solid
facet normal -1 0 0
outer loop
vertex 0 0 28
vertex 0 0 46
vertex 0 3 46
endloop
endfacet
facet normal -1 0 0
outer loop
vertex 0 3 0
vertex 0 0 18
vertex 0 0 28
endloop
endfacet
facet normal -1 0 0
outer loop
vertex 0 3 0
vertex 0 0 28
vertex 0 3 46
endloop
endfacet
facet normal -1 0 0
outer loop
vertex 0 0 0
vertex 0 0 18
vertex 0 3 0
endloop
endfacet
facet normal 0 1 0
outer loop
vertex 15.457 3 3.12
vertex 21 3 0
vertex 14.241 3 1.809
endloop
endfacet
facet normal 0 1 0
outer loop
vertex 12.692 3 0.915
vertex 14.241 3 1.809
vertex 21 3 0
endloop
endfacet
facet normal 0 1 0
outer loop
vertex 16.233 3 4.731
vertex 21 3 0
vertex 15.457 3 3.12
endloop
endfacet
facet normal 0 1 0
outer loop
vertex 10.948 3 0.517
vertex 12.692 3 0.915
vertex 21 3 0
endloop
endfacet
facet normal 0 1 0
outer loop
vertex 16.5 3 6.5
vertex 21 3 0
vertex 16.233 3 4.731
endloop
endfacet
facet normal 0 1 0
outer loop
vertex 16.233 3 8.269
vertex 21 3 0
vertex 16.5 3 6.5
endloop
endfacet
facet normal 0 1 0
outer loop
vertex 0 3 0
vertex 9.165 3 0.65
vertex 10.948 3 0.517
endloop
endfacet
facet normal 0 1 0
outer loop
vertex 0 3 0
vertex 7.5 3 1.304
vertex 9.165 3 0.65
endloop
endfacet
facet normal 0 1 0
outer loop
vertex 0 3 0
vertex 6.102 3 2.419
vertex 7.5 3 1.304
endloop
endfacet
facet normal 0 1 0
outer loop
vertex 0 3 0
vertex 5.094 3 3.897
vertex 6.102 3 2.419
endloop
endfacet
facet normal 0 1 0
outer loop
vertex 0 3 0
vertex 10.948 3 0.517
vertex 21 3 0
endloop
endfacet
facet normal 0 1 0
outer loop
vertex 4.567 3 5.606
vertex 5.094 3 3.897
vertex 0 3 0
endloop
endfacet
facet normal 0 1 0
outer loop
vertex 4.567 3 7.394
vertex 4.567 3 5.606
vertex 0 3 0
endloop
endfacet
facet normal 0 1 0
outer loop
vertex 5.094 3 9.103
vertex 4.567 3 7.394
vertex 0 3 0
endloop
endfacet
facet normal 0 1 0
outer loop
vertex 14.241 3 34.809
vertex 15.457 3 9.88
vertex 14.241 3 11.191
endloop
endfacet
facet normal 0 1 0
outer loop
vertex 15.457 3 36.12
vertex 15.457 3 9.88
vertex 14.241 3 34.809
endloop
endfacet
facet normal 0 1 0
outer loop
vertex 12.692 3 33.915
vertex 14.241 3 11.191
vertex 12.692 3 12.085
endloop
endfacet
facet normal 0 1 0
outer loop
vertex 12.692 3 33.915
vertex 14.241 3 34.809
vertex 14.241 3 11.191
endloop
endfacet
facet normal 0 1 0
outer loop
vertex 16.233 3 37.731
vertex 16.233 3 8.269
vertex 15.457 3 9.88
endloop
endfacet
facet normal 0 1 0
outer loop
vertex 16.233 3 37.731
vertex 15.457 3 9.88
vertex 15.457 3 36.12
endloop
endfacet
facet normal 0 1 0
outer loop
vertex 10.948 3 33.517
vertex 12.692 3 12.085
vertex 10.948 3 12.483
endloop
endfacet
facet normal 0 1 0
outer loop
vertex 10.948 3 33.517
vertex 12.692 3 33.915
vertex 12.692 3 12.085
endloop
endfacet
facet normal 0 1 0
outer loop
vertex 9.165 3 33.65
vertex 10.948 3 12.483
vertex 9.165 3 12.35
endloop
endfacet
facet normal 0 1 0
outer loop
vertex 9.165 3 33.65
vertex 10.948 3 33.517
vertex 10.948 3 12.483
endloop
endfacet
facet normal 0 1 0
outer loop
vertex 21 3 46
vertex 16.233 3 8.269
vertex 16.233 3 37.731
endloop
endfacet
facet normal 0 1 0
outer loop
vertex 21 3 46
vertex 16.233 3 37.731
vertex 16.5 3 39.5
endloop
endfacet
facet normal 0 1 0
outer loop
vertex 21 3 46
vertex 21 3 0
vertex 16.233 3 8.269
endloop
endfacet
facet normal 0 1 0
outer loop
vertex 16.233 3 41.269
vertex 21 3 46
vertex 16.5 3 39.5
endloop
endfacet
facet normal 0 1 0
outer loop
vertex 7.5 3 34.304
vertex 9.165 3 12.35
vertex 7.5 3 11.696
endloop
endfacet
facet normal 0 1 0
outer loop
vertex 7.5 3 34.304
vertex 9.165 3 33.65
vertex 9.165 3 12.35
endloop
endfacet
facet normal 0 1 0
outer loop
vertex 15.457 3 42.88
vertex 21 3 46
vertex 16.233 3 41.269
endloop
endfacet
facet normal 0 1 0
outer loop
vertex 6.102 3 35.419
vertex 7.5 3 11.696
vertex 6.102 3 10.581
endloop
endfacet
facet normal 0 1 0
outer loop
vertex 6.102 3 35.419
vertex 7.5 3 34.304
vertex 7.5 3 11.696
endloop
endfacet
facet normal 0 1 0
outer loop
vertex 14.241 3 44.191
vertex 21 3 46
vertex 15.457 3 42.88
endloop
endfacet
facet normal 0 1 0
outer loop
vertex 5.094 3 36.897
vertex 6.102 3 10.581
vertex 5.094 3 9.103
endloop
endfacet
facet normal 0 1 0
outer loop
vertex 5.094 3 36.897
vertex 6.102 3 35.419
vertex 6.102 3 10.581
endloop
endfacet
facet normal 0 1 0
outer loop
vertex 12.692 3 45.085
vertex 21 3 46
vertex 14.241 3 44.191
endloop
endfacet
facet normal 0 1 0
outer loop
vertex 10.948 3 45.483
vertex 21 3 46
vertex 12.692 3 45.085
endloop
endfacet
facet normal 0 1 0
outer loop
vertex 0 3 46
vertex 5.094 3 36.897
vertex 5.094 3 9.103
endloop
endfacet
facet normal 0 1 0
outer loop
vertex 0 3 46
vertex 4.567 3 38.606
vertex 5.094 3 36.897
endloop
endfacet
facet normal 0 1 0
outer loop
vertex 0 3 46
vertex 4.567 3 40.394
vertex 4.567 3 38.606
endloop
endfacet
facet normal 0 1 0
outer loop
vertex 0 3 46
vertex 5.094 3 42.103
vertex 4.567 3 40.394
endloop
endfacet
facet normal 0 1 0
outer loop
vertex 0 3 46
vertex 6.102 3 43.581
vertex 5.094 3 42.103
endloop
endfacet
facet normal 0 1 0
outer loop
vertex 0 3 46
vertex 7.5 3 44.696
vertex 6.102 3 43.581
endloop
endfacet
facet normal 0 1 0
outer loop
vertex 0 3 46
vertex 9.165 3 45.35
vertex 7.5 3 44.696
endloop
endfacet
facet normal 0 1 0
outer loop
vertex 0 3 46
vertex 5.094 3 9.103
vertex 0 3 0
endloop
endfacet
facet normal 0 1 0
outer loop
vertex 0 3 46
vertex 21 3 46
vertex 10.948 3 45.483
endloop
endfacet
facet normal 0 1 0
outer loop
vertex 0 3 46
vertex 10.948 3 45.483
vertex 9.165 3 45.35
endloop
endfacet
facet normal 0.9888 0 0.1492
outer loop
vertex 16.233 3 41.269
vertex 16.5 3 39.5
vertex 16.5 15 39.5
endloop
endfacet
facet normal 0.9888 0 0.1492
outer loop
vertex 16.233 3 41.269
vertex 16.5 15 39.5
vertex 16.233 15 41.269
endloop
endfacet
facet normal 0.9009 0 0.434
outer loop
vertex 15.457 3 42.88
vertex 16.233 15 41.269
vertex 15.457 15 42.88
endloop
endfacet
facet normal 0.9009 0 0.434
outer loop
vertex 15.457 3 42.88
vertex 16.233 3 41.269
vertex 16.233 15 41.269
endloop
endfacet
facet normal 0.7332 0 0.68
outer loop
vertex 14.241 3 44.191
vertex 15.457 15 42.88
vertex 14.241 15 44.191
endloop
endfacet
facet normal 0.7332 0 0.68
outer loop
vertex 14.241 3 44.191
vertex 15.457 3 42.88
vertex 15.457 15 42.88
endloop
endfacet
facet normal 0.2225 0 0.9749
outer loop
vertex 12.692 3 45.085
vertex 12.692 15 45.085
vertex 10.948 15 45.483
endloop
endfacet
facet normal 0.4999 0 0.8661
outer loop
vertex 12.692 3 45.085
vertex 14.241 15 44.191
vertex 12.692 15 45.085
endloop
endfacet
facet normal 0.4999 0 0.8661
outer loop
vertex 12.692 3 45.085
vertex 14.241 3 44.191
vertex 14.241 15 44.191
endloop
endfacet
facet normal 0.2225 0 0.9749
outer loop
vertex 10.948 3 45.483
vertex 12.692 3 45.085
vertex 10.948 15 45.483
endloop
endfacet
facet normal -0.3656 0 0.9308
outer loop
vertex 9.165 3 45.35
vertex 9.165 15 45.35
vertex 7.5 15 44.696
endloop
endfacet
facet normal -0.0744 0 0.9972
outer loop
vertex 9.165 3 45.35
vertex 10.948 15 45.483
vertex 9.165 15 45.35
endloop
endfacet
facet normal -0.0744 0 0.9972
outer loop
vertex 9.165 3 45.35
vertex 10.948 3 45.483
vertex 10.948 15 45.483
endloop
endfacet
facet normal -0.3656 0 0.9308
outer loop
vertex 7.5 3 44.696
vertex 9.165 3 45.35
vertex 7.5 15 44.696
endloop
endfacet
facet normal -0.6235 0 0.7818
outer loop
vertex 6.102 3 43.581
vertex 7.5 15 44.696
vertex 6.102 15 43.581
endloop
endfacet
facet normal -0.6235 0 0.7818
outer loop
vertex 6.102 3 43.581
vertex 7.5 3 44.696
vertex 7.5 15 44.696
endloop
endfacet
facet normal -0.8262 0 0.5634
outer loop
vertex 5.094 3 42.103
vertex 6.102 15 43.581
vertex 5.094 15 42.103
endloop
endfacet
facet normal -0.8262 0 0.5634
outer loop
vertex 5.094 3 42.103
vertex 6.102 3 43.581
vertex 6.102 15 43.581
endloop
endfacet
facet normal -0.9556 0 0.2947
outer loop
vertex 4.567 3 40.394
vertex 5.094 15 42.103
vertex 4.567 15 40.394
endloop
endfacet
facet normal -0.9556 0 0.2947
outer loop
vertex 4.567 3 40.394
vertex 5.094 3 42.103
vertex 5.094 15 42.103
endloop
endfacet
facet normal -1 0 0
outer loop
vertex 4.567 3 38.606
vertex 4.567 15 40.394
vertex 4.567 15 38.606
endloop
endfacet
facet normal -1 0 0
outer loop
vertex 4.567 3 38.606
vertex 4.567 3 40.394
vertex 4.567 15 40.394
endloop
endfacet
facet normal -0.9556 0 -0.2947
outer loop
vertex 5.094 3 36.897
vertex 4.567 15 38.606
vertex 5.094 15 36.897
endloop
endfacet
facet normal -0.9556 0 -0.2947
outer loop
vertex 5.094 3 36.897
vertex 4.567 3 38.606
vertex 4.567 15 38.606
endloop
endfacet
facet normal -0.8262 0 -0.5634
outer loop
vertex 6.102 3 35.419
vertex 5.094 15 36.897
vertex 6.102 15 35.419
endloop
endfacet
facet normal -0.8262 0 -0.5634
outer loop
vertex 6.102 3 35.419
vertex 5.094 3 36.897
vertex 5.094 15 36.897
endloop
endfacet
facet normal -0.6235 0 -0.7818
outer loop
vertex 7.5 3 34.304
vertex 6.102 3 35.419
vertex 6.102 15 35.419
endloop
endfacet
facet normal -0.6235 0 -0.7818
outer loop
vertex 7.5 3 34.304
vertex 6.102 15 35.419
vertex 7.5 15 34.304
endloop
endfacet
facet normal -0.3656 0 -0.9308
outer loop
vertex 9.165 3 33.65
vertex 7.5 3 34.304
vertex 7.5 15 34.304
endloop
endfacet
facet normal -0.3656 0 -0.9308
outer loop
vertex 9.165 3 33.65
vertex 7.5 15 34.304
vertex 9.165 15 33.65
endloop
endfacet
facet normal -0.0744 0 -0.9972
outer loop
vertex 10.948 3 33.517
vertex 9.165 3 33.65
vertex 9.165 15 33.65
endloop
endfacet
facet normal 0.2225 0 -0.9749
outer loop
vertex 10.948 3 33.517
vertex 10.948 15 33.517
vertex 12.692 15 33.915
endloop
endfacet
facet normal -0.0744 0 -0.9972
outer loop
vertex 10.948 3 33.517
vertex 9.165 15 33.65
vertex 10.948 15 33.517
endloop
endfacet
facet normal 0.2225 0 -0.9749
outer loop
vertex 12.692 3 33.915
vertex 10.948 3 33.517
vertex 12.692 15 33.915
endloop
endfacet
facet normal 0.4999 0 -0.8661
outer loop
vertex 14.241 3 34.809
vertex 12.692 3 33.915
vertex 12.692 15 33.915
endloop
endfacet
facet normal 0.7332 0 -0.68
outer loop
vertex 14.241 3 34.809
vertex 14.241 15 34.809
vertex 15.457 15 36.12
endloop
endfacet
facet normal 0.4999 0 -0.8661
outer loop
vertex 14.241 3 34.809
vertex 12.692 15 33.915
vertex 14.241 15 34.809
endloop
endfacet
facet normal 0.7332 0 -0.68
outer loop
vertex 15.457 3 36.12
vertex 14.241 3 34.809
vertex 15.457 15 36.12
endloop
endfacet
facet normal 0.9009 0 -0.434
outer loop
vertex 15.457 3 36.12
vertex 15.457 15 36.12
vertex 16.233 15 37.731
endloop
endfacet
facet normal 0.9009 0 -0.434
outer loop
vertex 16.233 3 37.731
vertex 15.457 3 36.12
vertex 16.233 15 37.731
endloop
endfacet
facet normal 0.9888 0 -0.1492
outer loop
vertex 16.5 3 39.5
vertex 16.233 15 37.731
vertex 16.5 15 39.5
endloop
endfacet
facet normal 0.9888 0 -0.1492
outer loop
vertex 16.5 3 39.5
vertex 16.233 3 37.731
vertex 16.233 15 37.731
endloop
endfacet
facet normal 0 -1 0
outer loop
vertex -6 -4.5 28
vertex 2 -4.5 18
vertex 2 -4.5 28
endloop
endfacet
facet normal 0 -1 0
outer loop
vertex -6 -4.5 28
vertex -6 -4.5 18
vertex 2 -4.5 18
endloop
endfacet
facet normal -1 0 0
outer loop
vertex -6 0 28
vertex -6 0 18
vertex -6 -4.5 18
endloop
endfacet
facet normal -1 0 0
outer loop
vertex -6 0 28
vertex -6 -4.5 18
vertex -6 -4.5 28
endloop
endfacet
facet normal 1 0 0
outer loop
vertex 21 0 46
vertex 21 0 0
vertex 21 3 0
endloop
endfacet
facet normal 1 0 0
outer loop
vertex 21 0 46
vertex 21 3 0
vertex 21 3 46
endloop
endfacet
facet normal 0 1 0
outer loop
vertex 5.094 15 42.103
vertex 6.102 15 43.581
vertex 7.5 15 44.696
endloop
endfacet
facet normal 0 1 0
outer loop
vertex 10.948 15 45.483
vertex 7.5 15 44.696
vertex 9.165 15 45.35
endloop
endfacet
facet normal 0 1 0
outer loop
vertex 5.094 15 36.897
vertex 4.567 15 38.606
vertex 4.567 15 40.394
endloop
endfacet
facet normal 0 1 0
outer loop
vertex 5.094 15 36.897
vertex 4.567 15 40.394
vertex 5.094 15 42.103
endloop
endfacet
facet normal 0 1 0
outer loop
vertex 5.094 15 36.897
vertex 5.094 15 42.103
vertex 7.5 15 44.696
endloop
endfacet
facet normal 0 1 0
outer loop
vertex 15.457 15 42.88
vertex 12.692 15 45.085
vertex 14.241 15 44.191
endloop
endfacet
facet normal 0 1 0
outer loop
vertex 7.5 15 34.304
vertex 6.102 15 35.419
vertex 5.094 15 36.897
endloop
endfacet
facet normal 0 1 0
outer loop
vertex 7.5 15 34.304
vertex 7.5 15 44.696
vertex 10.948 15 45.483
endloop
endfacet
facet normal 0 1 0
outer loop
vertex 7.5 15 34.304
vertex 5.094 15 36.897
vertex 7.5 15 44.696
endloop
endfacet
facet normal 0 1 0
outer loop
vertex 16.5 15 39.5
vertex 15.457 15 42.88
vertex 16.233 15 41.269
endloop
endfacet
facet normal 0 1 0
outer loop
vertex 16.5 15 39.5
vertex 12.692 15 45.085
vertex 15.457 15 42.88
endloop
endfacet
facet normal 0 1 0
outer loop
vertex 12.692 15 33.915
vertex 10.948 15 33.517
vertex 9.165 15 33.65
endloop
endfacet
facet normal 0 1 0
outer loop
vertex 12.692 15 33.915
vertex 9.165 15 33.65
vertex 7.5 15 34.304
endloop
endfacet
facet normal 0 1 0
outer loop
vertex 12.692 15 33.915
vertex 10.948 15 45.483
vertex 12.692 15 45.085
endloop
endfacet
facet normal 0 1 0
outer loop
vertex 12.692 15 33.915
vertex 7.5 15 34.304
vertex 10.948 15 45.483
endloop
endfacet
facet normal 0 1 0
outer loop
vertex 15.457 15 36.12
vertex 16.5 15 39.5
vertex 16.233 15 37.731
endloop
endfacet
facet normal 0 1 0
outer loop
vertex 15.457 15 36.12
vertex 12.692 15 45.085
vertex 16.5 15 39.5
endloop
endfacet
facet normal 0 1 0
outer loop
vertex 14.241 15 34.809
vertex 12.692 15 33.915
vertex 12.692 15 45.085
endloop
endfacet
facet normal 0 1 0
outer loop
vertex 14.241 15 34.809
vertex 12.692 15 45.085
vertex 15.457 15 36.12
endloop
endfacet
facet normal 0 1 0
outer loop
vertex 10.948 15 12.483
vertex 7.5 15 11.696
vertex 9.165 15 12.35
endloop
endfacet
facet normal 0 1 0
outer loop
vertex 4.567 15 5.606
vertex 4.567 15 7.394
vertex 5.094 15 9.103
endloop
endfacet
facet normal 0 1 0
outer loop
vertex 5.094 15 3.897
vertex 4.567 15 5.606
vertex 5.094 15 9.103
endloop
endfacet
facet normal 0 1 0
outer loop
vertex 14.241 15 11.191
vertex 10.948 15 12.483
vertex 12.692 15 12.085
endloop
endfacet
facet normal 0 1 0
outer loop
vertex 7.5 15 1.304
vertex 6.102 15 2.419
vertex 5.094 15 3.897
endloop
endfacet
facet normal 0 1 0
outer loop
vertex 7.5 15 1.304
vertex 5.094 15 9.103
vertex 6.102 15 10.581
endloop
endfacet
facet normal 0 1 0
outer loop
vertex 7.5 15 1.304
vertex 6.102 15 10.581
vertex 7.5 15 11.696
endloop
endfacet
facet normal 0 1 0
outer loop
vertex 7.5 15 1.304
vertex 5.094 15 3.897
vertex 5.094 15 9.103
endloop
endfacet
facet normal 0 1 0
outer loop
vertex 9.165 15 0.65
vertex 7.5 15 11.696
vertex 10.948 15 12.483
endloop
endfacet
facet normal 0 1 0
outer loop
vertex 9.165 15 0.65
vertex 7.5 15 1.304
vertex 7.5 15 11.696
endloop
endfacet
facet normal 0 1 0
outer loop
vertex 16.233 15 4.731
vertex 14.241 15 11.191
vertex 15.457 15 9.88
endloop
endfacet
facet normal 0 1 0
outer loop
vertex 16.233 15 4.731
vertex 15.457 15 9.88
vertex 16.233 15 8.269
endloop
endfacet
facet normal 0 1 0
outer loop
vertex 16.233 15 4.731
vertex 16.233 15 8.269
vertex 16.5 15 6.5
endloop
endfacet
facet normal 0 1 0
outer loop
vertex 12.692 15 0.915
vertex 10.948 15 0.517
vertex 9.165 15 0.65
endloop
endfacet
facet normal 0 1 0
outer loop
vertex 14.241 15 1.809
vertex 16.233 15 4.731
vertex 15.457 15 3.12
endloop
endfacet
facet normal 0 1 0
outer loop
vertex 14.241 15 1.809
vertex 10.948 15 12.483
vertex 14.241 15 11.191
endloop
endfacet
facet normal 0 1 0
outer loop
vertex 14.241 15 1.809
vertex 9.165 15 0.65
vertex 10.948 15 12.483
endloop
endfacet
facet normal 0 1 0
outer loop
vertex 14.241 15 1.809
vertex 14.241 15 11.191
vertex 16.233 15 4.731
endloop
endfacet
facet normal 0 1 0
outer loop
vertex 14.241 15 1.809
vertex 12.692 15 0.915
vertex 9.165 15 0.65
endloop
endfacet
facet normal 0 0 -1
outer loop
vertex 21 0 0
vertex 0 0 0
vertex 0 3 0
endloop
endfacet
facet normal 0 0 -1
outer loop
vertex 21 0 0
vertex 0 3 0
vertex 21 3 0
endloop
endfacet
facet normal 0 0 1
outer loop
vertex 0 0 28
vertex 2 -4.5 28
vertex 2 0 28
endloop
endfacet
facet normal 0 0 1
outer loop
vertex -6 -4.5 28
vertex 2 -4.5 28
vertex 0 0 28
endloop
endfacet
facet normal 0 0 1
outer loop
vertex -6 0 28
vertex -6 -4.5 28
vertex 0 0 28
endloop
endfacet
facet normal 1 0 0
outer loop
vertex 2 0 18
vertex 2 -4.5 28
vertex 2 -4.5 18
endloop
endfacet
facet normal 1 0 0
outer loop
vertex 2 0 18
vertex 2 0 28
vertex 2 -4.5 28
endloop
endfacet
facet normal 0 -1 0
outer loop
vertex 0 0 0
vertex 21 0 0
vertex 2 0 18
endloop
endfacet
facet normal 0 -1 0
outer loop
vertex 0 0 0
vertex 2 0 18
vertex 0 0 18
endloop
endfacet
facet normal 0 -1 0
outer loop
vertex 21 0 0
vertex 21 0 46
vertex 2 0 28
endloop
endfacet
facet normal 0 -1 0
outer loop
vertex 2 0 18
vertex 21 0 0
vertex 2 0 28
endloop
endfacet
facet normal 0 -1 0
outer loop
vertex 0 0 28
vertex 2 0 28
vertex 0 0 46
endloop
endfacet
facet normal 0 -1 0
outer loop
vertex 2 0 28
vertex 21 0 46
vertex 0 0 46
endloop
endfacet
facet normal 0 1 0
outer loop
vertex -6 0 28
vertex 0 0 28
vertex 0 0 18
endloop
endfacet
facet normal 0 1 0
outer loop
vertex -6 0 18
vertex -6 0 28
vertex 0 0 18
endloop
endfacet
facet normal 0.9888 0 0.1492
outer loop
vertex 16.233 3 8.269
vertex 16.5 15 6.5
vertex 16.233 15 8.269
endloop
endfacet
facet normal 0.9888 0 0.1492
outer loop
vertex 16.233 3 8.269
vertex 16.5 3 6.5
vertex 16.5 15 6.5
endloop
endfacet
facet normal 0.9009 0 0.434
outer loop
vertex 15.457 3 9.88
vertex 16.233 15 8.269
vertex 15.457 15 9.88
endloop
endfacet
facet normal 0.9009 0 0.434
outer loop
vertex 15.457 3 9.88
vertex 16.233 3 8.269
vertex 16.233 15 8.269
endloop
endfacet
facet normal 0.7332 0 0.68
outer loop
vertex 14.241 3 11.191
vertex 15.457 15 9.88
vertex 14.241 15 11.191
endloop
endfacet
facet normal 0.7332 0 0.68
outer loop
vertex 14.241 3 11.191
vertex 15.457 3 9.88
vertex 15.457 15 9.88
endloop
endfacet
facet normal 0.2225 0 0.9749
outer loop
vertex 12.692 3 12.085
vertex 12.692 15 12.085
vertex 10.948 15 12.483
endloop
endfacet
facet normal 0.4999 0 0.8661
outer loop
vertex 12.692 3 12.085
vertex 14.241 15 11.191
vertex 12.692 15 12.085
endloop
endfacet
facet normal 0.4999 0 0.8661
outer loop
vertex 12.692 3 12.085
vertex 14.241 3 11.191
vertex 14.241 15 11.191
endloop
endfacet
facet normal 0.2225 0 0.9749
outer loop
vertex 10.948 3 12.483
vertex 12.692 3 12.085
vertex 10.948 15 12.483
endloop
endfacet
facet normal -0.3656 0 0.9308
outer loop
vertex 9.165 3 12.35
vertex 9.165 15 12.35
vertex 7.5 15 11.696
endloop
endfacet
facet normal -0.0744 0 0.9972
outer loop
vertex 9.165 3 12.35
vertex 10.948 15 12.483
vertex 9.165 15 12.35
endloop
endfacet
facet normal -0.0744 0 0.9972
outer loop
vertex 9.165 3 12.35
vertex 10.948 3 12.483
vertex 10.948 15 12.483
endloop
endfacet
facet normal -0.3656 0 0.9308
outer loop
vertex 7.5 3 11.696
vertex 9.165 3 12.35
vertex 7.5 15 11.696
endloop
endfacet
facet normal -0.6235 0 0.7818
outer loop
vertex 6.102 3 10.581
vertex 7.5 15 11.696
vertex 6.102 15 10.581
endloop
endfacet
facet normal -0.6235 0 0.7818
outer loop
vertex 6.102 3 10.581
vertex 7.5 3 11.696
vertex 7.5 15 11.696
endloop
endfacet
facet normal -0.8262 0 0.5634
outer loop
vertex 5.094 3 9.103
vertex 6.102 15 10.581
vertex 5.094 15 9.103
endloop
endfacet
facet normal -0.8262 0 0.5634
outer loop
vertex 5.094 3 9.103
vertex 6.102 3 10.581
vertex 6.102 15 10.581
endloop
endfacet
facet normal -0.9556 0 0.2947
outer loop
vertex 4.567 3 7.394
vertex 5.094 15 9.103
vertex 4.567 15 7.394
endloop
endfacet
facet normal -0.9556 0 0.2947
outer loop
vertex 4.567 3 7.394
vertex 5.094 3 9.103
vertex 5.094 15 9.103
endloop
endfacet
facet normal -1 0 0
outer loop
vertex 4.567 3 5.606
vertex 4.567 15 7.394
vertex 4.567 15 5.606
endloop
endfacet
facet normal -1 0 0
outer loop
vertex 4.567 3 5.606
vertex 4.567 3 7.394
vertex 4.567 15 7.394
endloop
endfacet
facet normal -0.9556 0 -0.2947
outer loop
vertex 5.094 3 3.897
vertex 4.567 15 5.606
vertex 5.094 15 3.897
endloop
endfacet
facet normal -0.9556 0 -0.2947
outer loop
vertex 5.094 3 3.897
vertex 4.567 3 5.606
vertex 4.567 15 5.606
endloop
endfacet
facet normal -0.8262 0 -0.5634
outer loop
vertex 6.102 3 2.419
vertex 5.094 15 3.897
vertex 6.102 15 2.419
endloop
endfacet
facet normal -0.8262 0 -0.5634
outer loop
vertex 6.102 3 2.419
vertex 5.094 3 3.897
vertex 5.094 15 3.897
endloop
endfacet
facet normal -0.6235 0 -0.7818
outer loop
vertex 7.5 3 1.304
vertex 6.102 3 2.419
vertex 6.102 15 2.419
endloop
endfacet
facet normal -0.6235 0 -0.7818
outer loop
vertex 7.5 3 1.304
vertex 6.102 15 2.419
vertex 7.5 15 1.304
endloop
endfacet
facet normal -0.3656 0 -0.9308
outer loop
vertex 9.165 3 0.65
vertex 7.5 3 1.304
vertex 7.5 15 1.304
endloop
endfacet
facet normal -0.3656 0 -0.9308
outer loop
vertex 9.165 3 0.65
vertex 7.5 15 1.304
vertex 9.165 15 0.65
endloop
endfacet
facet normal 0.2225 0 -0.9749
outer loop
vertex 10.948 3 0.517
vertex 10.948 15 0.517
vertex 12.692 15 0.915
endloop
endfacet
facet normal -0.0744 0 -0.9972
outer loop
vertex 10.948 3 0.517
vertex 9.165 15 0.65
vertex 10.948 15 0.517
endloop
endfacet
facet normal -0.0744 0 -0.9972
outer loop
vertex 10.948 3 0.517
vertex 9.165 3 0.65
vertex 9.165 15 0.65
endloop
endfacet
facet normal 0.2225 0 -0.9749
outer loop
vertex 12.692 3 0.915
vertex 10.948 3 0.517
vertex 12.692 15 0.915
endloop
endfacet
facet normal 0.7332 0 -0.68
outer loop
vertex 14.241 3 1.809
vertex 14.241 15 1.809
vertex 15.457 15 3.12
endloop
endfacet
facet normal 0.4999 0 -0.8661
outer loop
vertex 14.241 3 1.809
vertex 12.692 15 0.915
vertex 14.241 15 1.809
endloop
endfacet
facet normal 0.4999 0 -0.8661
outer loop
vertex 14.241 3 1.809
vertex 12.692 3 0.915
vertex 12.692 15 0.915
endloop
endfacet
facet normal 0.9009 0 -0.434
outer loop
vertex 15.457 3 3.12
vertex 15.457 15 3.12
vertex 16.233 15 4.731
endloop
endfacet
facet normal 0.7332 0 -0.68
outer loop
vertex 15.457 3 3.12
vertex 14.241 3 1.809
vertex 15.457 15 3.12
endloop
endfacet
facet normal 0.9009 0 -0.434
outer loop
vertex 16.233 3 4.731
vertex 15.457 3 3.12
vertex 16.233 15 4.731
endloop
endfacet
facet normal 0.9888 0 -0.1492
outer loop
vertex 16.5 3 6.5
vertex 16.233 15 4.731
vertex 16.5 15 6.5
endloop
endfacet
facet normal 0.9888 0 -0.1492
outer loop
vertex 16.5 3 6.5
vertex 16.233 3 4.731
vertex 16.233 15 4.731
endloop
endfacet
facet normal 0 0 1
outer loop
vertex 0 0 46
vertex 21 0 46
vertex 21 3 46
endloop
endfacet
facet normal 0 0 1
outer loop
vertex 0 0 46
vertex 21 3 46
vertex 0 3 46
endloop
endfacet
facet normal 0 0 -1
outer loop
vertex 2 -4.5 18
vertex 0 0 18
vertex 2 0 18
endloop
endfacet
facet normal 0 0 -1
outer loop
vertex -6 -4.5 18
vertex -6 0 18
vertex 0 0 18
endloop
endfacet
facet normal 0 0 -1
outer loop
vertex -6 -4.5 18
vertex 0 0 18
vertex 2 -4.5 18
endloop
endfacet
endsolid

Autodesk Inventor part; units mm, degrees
ref_plane "YZ Plane" through (0, 0, 0) normal (1, 0, 0) x (0, 1, 0)
ref_plane "XZ Plane" through (0, 0, 0) normal (0, 1, 0) x (-1, 0, 0)
ref_plane "XY Plane" through (0, 0, 0) normal (0, 0, 1) x (1, 0, 0)
sketch "Sketch1" plane through (0, 0, 0) normal (0, 1, 0) x (-1, 0, 0)
  line L0 (0, 0) -> (-21, 0)
  line L1 (-21, 0) -> (-21, 46)
  line L2 (-21, 46) -> (0, 46)
  line L3 (0, 46) -> (0, 0)
  dimension "d0" = 21
  dimension "d1" = 46
extrude "Extrusion1" add sketch "Sketch1" along normal blind 3
sketch "Sketch2" plane through (0, 3, 0) normal (0, 1, 0) x (1, 0, 0)
  line L0 (21, 0) -> (0, 0) projected
  line L1 (0, -46) -> (21, -46) projected
  circle A0 centre (10.5, -39.5) radius 6
  line L2 (0, 0) -> (0, -46) projected
  line L3 (0, -23) -> (21, -23)
  line L4 (21, -46) -> (21, 0) projected
  circle A1 centre (10.5, -6.5) radius 6
  dimension "d6" = 12
extrude "Extrusion2" add sketch "Sketch2" along normal blind 12 contours A0 | A1
sketch "Sketch3" plane through (0, 0, 0) normal (-1, 0, 0) x (0, 0, 1)
  line L0 (46, 0) -> (0, 0) projected
  line L1 (18, 0) -> (28, 0)
  line L2 (28, 0) -> (28, -4.5)
  line L3 (28, -4.5) -> (18, -4.5)
  line L4 (18, -4.5) -> (18, 0)
  dimension "d11" = 10
extrude "Extrusion3" add sketch "Sketch3" along normal blind 6
sketch "Sketch4" plane through (0, 0, 0) normal (1, 0, 0) x (0, 0, -1)
  line L0 (-28, -4.5) -> (-28, 0) projected
  line L1 (-18, 0) -> (-18, -4.5) projected
  line L2 (-28, 0) -> (-18, 0)
  line L3 (-18, 0) -> (-18, -4.5)
  line L4 (-18, -4.5) -> (-28, -4.5)
  line L5 (-28, -4.5) -> (-28, 0)
  point P0 (0, 0)
extrude "Extrusion4" add sketch "Sketch4" along normal blind 2
properties part number "Sensore ultrasuoni"
